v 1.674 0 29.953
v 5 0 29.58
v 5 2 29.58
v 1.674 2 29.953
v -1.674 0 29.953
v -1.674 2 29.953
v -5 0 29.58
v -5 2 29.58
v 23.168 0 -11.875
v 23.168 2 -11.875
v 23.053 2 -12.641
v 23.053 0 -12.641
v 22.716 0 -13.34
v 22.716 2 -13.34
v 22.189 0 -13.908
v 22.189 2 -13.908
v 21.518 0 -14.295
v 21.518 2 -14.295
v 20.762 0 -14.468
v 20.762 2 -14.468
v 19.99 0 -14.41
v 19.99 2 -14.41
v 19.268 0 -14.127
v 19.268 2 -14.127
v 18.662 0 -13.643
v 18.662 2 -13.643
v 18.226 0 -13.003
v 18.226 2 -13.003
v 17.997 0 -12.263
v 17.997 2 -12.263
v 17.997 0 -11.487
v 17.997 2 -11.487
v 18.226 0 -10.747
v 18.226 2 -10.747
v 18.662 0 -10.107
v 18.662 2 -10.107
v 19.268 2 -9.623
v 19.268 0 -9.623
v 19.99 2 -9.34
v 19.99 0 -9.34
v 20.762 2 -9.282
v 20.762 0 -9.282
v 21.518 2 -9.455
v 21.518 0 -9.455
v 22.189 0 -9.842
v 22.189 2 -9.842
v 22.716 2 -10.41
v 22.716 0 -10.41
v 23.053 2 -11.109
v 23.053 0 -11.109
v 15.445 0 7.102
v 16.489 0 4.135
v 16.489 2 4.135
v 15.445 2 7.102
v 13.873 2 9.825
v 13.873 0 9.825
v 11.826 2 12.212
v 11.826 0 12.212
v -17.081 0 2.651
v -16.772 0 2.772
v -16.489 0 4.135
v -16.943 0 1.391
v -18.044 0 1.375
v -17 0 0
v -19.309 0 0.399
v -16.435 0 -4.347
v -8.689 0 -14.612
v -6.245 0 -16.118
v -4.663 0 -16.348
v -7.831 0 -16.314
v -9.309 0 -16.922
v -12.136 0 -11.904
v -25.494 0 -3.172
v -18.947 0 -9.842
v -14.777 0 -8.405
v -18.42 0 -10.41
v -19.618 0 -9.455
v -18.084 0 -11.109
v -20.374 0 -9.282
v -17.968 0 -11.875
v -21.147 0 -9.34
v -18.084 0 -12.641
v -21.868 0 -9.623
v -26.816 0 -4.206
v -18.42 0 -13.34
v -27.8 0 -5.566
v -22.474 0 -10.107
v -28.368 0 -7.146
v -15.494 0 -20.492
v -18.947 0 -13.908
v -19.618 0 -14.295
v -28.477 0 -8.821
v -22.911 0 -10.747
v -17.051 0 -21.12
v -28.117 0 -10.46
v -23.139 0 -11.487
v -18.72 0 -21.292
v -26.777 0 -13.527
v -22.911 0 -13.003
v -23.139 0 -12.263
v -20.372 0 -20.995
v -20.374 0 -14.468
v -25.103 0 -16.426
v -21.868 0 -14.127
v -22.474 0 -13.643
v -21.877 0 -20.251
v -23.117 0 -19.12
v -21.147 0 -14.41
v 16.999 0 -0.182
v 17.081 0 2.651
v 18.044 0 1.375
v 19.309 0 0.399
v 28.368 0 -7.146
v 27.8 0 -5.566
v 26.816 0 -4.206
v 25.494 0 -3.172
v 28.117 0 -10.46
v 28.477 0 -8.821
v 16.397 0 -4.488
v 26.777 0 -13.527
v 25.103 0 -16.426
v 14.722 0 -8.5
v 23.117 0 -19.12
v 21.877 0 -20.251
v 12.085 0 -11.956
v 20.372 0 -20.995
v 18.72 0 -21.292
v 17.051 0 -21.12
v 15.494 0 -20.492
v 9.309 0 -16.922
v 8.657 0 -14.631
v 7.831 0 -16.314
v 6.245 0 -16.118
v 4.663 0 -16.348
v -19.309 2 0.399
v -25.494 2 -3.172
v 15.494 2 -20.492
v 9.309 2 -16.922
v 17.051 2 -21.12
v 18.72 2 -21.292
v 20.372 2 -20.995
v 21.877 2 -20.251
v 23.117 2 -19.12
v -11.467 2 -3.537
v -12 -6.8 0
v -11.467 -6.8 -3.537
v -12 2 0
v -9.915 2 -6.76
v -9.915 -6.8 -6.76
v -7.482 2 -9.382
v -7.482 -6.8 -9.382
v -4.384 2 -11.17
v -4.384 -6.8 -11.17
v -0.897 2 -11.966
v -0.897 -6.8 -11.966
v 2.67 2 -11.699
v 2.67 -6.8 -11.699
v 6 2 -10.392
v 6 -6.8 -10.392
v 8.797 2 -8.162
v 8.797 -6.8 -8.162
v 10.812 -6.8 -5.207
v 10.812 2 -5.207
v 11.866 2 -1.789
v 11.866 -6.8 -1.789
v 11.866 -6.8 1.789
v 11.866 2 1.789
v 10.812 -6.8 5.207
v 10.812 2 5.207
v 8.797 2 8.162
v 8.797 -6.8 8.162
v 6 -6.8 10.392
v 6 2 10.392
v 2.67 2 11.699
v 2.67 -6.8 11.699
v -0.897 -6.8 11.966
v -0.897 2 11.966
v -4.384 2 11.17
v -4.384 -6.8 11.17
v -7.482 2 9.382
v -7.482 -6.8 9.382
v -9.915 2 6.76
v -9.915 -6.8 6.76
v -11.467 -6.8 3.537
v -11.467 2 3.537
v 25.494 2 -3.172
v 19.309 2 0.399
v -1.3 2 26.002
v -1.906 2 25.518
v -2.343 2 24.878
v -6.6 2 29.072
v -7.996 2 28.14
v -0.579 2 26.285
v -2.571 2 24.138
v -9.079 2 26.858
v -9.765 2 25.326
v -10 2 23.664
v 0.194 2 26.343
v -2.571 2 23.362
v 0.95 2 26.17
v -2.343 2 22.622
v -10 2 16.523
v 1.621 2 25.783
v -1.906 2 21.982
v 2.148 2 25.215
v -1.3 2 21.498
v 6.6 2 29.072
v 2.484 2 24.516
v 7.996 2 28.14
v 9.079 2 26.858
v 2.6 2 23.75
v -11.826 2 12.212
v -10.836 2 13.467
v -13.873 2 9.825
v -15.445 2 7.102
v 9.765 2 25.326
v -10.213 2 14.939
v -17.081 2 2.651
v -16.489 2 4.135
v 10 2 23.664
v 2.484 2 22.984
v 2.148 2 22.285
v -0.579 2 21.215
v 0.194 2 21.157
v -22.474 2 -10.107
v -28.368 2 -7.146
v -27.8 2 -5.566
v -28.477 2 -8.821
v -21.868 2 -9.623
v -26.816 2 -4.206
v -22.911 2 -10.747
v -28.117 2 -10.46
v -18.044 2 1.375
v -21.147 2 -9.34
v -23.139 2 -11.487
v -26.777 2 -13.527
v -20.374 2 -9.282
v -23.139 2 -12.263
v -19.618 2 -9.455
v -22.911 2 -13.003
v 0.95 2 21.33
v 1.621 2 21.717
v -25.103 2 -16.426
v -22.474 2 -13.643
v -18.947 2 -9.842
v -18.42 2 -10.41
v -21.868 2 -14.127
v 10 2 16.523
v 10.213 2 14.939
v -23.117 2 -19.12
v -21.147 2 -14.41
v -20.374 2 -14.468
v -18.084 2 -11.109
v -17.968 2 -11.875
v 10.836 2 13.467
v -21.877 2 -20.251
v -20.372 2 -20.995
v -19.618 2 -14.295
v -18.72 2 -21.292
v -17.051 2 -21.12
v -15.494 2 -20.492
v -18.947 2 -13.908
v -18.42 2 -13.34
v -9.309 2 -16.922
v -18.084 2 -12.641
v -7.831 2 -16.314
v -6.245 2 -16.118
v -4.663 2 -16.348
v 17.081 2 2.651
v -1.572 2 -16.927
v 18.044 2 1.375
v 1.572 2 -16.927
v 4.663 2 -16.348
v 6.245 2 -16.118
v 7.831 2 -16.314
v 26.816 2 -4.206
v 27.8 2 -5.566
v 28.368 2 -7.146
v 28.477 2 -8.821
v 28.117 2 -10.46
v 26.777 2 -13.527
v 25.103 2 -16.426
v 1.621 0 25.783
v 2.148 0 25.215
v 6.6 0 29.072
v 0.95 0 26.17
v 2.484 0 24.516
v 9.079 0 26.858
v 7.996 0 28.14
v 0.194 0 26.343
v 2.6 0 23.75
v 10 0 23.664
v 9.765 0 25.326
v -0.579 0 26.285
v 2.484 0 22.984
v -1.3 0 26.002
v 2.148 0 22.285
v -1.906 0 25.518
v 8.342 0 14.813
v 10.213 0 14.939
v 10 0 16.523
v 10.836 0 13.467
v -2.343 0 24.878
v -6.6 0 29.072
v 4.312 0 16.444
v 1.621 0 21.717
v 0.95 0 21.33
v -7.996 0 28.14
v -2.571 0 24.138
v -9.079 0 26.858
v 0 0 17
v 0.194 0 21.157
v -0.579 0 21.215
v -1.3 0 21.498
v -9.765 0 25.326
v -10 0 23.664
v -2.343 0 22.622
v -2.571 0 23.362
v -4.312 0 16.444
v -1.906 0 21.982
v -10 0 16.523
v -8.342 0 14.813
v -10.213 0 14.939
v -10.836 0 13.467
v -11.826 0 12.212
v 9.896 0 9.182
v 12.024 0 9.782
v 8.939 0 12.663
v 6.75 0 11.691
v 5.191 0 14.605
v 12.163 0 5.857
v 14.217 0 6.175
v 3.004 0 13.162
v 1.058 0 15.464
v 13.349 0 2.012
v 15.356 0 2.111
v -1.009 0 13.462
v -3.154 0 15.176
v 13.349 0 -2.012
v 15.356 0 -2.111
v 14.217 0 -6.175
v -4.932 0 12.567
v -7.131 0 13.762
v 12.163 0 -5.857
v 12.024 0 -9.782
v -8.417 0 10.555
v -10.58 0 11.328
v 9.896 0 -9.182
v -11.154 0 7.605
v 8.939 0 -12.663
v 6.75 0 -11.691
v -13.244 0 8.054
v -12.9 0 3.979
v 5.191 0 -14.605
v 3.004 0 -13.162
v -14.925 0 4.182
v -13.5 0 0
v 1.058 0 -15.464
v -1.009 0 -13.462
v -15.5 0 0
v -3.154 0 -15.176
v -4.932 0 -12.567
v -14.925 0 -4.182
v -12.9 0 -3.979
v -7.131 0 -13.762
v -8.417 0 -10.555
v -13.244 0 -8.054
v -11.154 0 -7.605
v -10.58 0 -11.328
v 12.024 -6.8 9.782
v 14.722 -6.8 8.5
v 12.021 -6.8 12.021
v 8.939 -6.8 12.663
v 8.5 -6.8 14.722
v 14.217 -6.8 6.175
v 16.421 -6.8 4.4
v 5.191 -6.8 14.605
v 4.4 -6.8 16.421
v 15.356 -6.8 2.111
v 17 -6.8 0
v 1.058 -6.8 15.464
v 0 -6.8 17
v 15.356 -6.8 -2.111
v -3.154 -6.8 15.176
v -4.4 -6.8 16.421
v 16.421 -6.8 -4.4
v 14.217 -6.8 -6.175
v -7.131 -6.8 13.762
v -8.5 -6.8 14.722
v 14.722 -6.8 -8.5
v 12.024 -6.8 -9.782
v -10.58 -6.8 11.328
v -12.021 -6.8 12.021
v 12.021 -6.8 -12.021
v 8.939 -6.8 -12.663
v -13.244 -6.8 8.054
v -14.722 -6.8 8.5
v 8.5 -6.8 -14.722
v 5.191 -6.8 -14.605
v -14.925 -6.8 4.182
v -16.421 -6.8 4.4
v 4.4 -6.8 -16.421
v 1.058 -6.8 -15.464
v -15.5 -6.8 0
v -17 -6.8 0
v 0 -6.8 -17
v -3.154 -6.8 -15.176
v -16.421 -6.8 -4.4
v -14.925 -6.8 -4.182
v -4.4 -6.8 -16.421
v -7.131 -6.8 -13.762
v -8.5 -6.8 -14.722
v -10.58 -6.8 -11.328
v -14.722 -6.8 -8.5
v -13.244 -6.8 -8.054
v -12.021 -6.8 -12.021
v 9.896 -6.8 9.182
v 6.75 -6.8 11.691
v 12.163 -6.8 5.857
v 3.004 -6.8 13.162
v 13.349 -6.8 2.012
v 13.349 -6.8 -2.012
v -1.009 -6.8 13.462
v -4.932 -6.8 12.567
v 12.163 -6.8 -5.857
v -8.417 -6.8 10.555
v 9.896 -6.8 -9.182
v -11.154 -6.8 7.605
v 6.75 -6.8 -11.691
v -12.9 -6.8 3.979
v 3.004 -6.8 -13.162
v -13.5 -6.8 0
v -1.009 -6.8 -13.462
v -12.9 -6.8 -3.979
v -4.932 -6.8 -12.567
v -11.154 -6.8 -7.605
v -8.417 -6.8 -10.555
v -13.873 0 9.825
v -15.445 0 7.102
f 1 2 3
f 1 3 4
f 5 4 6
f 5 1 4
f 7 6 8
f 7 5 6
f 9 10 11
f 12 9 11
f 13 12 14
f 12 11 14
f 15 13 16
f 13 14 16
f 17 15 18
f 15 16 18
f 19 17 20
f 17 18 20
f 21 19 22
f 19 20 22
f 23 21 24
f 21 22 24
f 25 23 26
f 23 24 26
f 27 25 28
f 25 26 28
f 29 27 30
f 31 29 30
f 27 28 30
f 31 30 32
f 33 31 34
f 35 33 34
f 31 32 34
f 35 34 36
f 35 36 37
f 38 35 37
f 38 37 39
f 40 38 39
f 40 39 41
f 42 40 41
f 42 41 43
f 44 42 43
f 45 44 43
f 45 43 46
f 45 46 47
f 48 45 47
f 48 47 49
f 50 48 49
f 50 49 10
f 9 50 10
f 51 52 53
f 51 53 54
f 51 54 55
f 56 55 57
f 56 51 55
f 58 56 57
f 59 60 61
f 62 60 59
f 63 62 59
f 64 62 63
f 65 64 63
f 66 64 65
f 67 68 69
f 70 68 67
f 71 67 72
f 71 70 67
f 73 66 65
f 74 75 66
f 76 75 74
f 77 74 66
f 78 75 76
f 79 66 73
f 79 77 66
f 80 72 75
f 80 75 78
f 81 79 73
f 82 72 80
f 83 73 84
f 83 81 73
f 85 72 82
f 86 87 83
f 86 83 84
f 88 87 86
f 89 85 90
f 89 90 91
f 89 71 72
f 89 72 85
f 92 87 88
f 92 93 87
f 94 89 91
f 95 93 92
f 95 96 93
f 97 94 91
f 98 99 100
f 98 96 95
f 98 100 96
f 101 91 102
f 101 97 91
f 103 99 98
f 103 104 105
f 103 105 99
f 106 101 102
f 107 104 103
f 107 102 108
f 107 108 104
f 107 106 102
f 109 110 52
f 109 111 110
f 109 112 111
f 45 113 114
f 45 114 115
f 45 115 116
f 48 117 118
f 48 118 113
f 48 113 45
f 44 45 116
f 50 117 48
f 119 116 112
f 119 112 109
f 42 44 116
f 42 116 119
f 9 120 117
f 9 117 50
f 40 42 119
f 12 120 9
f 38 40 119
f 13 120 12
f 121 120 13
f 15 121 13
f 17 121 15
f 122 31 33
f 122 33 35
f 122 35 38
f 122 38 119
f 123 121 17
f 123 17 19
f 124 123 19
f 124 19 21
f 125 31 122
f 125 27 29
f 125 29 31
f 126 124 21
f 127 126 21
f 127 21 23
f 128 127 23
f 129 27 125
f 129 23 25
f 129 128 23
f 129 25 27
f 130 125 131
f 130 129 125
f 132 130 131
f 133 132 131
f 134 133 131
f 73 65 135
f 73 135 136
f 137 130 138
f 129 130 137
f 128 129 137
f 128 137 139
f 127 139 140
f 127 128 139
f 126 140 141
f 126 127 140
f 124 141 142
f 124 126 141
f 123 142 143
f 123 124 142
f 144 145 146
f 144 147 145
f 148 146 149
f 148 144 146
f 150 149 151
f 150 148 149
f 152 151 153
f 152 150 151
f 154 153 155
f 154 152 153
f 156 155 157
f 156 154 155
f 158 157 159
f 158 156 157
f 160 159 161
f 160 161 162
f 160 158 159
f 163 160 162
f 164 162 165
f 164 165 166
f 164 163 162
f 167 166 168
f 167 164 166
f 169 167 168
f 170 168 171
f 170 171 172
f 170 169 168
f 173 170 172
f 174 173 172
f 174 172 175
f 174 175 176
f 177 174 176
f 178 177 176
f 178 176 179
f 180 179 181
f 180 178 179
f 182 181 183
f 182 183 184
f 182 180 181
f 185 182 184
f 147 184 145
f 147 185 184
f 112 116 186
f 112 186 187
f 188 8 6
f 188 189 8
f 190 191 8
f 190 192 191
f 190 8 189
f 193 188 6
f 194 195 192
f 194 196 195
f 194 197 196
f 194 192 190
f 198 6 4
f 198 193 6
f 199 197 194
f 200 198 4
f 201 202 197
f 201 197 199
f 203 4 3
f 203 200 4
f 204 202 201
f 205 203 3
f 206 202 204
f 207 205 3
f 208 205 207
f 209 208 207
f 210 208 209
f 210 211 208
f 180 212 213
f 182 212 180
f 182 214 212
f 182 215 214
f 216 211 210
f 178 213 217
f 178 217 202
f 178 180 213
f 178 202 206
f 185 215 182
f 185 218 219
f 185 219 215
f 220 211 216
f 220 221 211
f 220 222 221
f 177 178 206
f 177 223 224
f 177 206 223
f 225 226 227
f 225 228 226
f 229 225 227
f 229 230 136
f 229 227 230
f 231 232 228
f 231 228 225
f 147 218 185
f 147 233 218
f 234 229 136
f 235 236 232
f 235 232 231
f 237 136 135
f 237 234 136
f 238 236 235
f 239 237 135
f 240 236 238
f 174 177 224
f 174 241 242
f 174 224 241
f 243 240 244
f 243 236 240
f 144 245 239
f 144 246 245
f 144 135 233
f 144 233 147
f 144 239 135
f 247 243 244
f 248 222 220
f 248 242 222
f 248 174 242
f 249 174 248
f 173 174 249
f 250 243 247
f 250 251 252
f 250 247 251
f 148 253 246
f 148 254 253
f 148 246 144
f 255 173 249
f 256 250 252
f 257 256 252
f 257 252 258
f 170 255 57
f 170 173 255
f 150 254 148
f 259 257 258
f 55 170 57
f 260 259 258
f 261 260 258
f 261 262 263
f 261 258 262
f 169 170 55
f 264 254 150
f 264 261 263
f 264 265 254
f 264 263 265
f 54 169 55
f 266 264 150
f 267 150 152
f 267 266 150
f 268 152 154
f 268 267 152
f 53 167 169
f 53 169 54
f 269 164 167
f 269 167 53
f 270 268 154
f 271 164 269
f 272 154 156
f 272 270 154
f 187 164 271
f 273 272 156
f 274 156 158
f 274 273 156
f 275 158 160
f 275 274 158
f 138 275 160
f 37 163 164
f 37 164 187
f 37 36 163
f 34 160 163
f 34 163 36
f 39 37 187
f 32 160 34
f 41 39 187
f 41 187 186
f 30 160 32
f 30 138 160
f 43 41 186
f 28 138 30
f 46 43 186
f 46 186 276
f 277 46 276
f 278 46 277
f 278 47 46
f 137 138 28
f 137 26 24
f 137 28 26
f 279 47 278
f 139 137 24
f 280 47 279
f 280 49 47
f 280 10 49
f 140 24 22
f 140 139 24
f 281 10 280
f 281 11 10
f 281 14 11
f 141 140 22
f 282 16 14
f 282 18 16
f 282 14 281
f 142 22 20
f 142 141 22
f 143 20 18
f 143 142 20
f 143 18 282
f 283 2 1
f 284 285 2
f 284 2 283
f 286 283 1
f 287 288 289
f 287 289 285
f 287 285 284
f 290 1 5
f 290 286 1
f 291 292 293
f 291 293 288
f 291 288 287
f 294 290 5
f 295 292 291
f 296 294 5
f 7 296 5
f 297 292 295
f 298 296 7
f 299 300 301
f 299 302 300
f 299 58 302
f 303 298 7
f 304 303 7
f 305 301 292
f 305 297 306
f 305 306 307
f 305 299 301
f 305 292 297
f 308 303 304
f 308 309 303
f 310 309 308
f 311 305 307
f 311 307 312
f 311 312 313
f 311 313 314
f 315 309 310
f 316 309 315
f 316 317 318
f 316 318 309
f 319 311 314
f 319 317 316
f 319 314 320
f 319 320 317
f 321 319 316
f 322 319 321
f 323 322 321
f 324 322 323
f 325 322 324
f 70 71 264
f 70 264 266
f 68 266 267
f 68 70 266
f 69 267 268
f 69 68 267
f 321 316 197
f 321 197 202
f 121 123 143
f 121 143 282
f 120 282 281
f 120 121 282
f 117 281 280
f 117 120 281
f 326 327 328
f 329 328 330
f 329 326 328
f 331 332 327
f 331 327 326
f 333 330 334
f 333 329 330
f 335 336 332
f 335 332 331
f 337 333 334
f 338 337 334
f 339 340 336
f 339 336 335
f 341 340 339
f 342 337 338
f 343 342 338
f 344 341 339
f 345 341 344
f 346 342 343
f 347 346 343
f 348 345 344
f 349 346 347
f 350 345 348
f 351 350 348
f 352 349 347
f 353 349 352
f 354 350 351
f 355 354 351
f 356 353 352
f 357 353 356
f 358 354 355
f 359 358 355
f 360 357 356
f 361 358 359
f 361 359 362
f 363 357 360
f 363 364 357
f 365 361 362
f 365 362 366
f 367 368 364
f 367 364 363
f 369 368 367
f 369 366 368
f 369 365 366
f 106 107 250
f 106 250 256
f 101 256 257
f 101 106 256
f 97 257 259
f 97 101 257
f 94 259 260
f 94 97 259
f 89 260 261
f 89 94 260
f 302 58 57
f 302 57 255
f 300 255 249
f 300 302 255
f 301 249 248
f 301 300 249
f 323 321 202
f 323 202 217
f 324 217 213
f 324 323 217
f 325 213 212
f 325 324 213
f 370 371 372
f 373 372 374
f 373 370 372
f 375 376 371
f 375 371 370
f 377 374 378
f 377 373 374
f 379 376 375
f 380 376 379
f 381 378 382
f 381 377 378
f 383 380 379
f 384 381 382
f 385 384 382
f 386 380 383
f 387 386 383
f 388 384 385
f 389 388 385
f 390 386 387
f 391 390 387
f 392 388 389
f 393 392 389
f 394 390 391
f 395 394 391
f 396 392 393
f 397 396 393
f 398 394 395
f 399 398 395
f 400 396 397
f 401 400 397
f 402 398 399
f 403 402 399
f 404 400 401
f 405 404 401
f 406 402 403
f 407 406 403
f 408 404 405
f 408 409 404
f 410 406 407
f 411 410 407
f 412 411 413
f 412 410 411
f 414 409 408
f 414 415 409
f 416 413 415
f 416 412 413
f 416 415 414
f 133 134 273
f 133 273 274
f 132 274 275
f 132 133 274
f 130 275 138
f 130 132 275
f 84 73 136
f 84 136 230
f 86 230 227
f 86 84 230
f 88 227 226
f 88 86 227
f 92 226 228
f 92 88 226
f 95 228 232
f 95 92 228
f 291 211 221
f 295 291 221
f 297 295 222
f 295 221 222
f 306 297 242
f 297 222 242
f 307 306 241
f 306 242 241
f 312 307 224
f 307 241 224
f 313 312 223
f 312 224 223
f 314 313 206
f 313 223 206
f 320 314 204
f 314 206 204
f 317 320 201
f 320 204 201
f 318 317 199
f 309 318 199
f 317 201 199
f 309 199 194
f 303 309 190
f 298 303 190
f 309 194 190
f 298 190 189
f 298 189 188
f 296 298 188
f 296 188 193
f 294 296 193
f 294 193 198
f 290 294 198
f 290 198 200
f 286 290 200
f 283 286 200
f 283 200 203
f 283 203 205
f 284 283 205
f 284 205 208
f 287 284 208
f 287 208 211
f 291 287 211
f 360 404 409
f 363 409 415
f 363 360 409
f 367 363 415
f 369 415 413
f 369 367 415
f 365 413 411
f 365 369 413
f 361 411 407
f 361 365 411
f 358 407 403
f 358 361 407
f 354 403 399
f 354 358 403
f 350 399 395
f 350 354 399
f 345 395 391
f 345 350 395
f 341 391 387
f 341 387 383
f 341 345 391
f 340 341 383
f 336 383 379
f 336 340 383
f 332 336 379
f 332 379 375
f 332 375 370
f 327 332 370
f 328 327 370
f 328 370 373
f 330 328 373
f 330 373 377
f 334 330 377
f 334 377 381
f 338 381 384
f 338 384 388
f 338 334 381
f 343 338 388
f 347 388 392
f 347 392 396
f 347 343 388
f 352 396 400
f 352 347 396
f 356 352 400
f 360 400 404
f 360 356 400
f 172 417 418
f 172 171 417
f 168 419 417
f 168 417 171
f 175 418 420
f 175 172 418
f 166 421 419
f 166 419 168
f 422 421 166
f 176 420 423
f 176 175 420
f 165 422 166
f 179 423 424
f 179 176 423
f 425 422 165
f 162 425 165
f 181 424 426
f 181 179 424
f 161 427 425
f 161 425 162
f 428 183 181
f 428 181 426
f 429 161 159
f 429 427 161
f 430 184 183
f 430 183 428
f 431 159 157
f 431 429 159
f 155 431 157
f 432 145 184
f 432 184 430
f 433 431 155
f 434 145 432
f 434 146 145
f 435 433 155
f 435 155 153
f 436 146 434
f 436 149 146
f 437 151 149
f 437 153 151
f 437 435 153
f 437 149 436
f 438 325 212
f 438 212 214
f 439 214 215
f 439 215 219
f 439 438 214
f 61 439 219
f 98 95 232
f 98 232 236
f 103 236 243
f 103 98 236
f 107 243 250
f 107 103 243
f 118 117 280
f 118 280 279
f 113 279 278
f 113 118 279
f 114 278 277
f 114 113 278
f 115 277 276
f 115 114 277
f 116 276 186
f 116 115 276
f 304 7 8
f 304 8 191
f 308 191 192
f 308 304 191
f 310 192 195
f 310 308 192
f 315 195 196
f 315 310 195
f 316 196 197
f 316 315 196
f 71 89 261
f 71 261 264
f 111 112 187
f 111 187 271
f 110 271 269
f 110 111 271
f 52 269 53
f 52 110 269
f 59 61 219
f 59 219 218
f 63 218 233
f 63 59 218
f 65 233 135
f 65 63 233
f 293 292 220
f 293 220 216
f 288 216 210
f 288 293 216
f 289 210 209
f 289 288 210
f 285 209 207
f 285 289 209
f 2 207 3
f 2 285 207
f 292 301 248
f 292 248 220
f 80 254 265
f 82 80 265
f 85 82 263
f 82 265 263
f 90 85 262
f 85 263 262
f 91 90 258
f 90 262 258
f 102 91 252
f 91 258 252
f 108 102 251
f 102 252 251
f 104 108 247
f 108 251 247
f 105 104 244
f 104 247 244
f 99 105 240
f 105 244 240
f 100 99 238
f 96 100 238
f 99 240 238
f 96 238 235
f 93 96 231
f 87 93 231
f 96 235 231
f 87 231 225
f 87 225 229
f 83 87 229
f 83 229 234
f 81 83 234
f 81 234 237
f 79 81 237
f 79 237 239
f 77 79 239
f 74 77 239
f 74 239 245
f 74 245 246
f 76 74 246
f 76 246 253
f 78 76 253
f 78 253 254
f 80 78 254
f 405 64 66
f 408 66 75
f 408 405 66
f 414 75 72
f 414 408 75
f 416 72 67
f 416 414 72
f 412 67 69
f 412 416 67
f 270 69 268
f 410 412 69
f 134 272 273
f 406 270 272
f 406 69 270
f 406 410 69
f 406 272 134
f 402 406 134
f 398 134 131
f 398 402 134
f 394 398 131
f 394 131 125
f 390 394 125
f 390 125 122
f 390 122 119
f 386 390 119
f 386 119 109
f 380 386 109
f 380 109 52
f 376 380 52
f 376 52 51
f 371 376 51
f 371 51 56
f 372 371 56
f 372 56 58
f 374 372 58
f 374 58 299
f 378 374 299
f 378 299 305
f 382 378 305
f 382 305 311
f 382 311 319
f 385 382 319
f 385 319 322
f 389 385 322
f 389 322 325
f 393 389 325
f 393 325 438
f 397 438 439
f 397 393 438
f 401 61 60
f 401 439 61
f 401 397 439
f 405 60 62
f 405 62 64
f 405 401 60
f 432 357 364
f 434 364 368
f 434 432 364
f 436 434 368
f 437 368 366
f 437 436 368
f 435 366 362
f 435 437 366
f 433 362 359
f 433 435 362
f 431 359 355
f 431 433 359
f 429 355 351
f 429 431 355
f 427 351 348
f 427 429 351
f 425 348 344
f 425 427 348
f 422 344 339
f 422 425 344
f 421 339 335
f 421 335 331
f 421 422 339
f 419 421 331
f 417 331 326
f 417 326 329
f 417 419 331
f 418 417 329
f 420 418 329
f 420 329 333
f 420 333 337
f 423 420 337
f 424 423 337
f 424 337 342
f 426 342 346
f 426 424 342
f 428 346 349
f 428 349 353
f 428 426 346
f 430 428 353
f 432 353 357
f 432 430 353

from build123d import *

# Parameters (mm, degrees)
TOP_VIEW_PATTERN_SKETCH_OUTSIDE_W = 104.696
TOP_VIEW_PATTERN_SKETCH_OUTSIDE_H = 104.696
TOP_VIEW_PATTERN_SKETCH_OUTSIDE_R = 6
CUT_EXTRUDE1_DEPTH                = 15
F_4_0MM_DOWEL_HOLE1_D             = 5.2


with BuildPart() as part:
    # Sketch2 → Revolve1 (revolve)
    with BuildSketch(Plane.XY):
        Polygon((-40, 0), (-17, 0), (-17, -6.8), (-15.5, -6.8), (-15.5, 0), (-13.5, 0), (-13.5, -6.8), (-12, -6.8), (-12, 2), (-40, 2), align=None)
    revolve(axis=Axis((0, 30.077146874, 0), (0, -1, 0)))

    # Top View Pattern Sketch outside → Cut-Extrude1 (cut, symmetric)
    with BuildSketch(Plane(origin=(0, 0, 0), x_dir=(1, 0, 0), z_dir=(0, 1, 0))):
        Rectangle(TOP_VIEW_PATTERN_SKETCH_OUTSIDE_W, TOP_VIEW_PATTERN_SKETCH_OUTSIDE_H)
        with BuildLine():
            Line((-10, -23.664319132), (-10, -16.522711642))
            ThreePointArc((-10, -16.522711642), (-10.475351674, -14.182143149), (-11.826086957, -12.21243904))
            ThreePointArc((-11.826086957, -12.21243904), (-14.722431864, -8.5), (-16.489325929, -4.135472212))
            ThreePointArc((-16.489325929, -4.135472212), (-17.519772084, -1.980849088), (-19.309088021, -0.398898217))
            Line((-19.309088021, -0.398898217), (-25.493901532, 3.171905528))
            ThreePointArc((-25.493901532, 3.171905528), (-28.139291346, 6.335922658), (-28.117376915, 10.460072439))
            ThreePointArc((-28.117376915, 10.460072439), (-25.980762114, 15), (-23.117376915, 19.120326477))
            ThreePointArc((-23.117376915, 19.120326477), (-19.556715651, 21.201379821), (-15.493901532, 20.492413604))
            Line((-15.493901532, 20.492413604), (-9.309088021, 16.921609859))
            ThreePointArc((-9.309088021, 16.921609859), (-7.04442041, 16.162992237), (-4.663238972, 16.347911252))
            ThreePointArc((-4.663238972, 16.347911252), (0, 17), (4.663238972, 16.347911252))
            ThreePointArc((4.663238972, 16.347911252), (7.04442041, 16.162992237), (9.309088021, 16.921609859))
            Line((9.309088021, 16.921609859), (15.493901532, 20.492413604))
            ThreePointArc((15.493901532, 20.492413604), (19.556715651, 21.201379821), (23.117376915, 19.120326477))
            ThreePointArc((23.117376915, 19.120326477), (25.980762114, 15), (28.117376915, 10.460072439))
            ThreePointArc((28.117376915, 10.460072439), (28.139291346, 6.335922658), (25.493901532, 3.171905528))
            Line((25.493901532, 3.171905528), (19.309088021, -0.398898217))
            ThreePointArc((19.309088021, -0.398898217), (17.519772084, -1.980849088), (16.489325929, -4.135472212))
            ThreePointArc((16.489325929, -4.135472212), (14.722431864, -8.5), (11.826086957, -12.21243904))
            ThreePointArc((11.826086957, -12.21243904), (10.475351674, -14.182143149), (10, -16.522711642))
            Line((10, -16.522711642), (10, -23.664319132))
            ThreePointArc((10, -23.664319132), (8.582575695, -27.537302479), (5, -29.580398915))
            ThreePointArc((5, -29.580398915), (0, -30), (-5, -29.580398915))
            ThreePointArc((-5, -29.580398915), (-8.582575695, -27.537302479), (-10, -23.664319132))
        make_face(mode=Mode.SUBTRACT)
        Circle(TOP_VIEW_PATTERN_SKETCH_OUTSIDE_R)
    extrude(amount=CUT_EXTRUDE1_DEPTH, both=True, mode=Mode.SUBTRACT)

    # Ø4.0mm Dowel Hole1 (through all)
    with Locations(Plane(origin=(0, 0, 0), x_dir=(-1, 0, 0), z_dir=(0, -1, 0))):
        with Locations((0, -23.75), (20.56810334, 11.875), (-20.56810334, 11.875)):
            Hole(F_4_0MM_DOWEL_HOLE1_D / 2)


solid = part.part
